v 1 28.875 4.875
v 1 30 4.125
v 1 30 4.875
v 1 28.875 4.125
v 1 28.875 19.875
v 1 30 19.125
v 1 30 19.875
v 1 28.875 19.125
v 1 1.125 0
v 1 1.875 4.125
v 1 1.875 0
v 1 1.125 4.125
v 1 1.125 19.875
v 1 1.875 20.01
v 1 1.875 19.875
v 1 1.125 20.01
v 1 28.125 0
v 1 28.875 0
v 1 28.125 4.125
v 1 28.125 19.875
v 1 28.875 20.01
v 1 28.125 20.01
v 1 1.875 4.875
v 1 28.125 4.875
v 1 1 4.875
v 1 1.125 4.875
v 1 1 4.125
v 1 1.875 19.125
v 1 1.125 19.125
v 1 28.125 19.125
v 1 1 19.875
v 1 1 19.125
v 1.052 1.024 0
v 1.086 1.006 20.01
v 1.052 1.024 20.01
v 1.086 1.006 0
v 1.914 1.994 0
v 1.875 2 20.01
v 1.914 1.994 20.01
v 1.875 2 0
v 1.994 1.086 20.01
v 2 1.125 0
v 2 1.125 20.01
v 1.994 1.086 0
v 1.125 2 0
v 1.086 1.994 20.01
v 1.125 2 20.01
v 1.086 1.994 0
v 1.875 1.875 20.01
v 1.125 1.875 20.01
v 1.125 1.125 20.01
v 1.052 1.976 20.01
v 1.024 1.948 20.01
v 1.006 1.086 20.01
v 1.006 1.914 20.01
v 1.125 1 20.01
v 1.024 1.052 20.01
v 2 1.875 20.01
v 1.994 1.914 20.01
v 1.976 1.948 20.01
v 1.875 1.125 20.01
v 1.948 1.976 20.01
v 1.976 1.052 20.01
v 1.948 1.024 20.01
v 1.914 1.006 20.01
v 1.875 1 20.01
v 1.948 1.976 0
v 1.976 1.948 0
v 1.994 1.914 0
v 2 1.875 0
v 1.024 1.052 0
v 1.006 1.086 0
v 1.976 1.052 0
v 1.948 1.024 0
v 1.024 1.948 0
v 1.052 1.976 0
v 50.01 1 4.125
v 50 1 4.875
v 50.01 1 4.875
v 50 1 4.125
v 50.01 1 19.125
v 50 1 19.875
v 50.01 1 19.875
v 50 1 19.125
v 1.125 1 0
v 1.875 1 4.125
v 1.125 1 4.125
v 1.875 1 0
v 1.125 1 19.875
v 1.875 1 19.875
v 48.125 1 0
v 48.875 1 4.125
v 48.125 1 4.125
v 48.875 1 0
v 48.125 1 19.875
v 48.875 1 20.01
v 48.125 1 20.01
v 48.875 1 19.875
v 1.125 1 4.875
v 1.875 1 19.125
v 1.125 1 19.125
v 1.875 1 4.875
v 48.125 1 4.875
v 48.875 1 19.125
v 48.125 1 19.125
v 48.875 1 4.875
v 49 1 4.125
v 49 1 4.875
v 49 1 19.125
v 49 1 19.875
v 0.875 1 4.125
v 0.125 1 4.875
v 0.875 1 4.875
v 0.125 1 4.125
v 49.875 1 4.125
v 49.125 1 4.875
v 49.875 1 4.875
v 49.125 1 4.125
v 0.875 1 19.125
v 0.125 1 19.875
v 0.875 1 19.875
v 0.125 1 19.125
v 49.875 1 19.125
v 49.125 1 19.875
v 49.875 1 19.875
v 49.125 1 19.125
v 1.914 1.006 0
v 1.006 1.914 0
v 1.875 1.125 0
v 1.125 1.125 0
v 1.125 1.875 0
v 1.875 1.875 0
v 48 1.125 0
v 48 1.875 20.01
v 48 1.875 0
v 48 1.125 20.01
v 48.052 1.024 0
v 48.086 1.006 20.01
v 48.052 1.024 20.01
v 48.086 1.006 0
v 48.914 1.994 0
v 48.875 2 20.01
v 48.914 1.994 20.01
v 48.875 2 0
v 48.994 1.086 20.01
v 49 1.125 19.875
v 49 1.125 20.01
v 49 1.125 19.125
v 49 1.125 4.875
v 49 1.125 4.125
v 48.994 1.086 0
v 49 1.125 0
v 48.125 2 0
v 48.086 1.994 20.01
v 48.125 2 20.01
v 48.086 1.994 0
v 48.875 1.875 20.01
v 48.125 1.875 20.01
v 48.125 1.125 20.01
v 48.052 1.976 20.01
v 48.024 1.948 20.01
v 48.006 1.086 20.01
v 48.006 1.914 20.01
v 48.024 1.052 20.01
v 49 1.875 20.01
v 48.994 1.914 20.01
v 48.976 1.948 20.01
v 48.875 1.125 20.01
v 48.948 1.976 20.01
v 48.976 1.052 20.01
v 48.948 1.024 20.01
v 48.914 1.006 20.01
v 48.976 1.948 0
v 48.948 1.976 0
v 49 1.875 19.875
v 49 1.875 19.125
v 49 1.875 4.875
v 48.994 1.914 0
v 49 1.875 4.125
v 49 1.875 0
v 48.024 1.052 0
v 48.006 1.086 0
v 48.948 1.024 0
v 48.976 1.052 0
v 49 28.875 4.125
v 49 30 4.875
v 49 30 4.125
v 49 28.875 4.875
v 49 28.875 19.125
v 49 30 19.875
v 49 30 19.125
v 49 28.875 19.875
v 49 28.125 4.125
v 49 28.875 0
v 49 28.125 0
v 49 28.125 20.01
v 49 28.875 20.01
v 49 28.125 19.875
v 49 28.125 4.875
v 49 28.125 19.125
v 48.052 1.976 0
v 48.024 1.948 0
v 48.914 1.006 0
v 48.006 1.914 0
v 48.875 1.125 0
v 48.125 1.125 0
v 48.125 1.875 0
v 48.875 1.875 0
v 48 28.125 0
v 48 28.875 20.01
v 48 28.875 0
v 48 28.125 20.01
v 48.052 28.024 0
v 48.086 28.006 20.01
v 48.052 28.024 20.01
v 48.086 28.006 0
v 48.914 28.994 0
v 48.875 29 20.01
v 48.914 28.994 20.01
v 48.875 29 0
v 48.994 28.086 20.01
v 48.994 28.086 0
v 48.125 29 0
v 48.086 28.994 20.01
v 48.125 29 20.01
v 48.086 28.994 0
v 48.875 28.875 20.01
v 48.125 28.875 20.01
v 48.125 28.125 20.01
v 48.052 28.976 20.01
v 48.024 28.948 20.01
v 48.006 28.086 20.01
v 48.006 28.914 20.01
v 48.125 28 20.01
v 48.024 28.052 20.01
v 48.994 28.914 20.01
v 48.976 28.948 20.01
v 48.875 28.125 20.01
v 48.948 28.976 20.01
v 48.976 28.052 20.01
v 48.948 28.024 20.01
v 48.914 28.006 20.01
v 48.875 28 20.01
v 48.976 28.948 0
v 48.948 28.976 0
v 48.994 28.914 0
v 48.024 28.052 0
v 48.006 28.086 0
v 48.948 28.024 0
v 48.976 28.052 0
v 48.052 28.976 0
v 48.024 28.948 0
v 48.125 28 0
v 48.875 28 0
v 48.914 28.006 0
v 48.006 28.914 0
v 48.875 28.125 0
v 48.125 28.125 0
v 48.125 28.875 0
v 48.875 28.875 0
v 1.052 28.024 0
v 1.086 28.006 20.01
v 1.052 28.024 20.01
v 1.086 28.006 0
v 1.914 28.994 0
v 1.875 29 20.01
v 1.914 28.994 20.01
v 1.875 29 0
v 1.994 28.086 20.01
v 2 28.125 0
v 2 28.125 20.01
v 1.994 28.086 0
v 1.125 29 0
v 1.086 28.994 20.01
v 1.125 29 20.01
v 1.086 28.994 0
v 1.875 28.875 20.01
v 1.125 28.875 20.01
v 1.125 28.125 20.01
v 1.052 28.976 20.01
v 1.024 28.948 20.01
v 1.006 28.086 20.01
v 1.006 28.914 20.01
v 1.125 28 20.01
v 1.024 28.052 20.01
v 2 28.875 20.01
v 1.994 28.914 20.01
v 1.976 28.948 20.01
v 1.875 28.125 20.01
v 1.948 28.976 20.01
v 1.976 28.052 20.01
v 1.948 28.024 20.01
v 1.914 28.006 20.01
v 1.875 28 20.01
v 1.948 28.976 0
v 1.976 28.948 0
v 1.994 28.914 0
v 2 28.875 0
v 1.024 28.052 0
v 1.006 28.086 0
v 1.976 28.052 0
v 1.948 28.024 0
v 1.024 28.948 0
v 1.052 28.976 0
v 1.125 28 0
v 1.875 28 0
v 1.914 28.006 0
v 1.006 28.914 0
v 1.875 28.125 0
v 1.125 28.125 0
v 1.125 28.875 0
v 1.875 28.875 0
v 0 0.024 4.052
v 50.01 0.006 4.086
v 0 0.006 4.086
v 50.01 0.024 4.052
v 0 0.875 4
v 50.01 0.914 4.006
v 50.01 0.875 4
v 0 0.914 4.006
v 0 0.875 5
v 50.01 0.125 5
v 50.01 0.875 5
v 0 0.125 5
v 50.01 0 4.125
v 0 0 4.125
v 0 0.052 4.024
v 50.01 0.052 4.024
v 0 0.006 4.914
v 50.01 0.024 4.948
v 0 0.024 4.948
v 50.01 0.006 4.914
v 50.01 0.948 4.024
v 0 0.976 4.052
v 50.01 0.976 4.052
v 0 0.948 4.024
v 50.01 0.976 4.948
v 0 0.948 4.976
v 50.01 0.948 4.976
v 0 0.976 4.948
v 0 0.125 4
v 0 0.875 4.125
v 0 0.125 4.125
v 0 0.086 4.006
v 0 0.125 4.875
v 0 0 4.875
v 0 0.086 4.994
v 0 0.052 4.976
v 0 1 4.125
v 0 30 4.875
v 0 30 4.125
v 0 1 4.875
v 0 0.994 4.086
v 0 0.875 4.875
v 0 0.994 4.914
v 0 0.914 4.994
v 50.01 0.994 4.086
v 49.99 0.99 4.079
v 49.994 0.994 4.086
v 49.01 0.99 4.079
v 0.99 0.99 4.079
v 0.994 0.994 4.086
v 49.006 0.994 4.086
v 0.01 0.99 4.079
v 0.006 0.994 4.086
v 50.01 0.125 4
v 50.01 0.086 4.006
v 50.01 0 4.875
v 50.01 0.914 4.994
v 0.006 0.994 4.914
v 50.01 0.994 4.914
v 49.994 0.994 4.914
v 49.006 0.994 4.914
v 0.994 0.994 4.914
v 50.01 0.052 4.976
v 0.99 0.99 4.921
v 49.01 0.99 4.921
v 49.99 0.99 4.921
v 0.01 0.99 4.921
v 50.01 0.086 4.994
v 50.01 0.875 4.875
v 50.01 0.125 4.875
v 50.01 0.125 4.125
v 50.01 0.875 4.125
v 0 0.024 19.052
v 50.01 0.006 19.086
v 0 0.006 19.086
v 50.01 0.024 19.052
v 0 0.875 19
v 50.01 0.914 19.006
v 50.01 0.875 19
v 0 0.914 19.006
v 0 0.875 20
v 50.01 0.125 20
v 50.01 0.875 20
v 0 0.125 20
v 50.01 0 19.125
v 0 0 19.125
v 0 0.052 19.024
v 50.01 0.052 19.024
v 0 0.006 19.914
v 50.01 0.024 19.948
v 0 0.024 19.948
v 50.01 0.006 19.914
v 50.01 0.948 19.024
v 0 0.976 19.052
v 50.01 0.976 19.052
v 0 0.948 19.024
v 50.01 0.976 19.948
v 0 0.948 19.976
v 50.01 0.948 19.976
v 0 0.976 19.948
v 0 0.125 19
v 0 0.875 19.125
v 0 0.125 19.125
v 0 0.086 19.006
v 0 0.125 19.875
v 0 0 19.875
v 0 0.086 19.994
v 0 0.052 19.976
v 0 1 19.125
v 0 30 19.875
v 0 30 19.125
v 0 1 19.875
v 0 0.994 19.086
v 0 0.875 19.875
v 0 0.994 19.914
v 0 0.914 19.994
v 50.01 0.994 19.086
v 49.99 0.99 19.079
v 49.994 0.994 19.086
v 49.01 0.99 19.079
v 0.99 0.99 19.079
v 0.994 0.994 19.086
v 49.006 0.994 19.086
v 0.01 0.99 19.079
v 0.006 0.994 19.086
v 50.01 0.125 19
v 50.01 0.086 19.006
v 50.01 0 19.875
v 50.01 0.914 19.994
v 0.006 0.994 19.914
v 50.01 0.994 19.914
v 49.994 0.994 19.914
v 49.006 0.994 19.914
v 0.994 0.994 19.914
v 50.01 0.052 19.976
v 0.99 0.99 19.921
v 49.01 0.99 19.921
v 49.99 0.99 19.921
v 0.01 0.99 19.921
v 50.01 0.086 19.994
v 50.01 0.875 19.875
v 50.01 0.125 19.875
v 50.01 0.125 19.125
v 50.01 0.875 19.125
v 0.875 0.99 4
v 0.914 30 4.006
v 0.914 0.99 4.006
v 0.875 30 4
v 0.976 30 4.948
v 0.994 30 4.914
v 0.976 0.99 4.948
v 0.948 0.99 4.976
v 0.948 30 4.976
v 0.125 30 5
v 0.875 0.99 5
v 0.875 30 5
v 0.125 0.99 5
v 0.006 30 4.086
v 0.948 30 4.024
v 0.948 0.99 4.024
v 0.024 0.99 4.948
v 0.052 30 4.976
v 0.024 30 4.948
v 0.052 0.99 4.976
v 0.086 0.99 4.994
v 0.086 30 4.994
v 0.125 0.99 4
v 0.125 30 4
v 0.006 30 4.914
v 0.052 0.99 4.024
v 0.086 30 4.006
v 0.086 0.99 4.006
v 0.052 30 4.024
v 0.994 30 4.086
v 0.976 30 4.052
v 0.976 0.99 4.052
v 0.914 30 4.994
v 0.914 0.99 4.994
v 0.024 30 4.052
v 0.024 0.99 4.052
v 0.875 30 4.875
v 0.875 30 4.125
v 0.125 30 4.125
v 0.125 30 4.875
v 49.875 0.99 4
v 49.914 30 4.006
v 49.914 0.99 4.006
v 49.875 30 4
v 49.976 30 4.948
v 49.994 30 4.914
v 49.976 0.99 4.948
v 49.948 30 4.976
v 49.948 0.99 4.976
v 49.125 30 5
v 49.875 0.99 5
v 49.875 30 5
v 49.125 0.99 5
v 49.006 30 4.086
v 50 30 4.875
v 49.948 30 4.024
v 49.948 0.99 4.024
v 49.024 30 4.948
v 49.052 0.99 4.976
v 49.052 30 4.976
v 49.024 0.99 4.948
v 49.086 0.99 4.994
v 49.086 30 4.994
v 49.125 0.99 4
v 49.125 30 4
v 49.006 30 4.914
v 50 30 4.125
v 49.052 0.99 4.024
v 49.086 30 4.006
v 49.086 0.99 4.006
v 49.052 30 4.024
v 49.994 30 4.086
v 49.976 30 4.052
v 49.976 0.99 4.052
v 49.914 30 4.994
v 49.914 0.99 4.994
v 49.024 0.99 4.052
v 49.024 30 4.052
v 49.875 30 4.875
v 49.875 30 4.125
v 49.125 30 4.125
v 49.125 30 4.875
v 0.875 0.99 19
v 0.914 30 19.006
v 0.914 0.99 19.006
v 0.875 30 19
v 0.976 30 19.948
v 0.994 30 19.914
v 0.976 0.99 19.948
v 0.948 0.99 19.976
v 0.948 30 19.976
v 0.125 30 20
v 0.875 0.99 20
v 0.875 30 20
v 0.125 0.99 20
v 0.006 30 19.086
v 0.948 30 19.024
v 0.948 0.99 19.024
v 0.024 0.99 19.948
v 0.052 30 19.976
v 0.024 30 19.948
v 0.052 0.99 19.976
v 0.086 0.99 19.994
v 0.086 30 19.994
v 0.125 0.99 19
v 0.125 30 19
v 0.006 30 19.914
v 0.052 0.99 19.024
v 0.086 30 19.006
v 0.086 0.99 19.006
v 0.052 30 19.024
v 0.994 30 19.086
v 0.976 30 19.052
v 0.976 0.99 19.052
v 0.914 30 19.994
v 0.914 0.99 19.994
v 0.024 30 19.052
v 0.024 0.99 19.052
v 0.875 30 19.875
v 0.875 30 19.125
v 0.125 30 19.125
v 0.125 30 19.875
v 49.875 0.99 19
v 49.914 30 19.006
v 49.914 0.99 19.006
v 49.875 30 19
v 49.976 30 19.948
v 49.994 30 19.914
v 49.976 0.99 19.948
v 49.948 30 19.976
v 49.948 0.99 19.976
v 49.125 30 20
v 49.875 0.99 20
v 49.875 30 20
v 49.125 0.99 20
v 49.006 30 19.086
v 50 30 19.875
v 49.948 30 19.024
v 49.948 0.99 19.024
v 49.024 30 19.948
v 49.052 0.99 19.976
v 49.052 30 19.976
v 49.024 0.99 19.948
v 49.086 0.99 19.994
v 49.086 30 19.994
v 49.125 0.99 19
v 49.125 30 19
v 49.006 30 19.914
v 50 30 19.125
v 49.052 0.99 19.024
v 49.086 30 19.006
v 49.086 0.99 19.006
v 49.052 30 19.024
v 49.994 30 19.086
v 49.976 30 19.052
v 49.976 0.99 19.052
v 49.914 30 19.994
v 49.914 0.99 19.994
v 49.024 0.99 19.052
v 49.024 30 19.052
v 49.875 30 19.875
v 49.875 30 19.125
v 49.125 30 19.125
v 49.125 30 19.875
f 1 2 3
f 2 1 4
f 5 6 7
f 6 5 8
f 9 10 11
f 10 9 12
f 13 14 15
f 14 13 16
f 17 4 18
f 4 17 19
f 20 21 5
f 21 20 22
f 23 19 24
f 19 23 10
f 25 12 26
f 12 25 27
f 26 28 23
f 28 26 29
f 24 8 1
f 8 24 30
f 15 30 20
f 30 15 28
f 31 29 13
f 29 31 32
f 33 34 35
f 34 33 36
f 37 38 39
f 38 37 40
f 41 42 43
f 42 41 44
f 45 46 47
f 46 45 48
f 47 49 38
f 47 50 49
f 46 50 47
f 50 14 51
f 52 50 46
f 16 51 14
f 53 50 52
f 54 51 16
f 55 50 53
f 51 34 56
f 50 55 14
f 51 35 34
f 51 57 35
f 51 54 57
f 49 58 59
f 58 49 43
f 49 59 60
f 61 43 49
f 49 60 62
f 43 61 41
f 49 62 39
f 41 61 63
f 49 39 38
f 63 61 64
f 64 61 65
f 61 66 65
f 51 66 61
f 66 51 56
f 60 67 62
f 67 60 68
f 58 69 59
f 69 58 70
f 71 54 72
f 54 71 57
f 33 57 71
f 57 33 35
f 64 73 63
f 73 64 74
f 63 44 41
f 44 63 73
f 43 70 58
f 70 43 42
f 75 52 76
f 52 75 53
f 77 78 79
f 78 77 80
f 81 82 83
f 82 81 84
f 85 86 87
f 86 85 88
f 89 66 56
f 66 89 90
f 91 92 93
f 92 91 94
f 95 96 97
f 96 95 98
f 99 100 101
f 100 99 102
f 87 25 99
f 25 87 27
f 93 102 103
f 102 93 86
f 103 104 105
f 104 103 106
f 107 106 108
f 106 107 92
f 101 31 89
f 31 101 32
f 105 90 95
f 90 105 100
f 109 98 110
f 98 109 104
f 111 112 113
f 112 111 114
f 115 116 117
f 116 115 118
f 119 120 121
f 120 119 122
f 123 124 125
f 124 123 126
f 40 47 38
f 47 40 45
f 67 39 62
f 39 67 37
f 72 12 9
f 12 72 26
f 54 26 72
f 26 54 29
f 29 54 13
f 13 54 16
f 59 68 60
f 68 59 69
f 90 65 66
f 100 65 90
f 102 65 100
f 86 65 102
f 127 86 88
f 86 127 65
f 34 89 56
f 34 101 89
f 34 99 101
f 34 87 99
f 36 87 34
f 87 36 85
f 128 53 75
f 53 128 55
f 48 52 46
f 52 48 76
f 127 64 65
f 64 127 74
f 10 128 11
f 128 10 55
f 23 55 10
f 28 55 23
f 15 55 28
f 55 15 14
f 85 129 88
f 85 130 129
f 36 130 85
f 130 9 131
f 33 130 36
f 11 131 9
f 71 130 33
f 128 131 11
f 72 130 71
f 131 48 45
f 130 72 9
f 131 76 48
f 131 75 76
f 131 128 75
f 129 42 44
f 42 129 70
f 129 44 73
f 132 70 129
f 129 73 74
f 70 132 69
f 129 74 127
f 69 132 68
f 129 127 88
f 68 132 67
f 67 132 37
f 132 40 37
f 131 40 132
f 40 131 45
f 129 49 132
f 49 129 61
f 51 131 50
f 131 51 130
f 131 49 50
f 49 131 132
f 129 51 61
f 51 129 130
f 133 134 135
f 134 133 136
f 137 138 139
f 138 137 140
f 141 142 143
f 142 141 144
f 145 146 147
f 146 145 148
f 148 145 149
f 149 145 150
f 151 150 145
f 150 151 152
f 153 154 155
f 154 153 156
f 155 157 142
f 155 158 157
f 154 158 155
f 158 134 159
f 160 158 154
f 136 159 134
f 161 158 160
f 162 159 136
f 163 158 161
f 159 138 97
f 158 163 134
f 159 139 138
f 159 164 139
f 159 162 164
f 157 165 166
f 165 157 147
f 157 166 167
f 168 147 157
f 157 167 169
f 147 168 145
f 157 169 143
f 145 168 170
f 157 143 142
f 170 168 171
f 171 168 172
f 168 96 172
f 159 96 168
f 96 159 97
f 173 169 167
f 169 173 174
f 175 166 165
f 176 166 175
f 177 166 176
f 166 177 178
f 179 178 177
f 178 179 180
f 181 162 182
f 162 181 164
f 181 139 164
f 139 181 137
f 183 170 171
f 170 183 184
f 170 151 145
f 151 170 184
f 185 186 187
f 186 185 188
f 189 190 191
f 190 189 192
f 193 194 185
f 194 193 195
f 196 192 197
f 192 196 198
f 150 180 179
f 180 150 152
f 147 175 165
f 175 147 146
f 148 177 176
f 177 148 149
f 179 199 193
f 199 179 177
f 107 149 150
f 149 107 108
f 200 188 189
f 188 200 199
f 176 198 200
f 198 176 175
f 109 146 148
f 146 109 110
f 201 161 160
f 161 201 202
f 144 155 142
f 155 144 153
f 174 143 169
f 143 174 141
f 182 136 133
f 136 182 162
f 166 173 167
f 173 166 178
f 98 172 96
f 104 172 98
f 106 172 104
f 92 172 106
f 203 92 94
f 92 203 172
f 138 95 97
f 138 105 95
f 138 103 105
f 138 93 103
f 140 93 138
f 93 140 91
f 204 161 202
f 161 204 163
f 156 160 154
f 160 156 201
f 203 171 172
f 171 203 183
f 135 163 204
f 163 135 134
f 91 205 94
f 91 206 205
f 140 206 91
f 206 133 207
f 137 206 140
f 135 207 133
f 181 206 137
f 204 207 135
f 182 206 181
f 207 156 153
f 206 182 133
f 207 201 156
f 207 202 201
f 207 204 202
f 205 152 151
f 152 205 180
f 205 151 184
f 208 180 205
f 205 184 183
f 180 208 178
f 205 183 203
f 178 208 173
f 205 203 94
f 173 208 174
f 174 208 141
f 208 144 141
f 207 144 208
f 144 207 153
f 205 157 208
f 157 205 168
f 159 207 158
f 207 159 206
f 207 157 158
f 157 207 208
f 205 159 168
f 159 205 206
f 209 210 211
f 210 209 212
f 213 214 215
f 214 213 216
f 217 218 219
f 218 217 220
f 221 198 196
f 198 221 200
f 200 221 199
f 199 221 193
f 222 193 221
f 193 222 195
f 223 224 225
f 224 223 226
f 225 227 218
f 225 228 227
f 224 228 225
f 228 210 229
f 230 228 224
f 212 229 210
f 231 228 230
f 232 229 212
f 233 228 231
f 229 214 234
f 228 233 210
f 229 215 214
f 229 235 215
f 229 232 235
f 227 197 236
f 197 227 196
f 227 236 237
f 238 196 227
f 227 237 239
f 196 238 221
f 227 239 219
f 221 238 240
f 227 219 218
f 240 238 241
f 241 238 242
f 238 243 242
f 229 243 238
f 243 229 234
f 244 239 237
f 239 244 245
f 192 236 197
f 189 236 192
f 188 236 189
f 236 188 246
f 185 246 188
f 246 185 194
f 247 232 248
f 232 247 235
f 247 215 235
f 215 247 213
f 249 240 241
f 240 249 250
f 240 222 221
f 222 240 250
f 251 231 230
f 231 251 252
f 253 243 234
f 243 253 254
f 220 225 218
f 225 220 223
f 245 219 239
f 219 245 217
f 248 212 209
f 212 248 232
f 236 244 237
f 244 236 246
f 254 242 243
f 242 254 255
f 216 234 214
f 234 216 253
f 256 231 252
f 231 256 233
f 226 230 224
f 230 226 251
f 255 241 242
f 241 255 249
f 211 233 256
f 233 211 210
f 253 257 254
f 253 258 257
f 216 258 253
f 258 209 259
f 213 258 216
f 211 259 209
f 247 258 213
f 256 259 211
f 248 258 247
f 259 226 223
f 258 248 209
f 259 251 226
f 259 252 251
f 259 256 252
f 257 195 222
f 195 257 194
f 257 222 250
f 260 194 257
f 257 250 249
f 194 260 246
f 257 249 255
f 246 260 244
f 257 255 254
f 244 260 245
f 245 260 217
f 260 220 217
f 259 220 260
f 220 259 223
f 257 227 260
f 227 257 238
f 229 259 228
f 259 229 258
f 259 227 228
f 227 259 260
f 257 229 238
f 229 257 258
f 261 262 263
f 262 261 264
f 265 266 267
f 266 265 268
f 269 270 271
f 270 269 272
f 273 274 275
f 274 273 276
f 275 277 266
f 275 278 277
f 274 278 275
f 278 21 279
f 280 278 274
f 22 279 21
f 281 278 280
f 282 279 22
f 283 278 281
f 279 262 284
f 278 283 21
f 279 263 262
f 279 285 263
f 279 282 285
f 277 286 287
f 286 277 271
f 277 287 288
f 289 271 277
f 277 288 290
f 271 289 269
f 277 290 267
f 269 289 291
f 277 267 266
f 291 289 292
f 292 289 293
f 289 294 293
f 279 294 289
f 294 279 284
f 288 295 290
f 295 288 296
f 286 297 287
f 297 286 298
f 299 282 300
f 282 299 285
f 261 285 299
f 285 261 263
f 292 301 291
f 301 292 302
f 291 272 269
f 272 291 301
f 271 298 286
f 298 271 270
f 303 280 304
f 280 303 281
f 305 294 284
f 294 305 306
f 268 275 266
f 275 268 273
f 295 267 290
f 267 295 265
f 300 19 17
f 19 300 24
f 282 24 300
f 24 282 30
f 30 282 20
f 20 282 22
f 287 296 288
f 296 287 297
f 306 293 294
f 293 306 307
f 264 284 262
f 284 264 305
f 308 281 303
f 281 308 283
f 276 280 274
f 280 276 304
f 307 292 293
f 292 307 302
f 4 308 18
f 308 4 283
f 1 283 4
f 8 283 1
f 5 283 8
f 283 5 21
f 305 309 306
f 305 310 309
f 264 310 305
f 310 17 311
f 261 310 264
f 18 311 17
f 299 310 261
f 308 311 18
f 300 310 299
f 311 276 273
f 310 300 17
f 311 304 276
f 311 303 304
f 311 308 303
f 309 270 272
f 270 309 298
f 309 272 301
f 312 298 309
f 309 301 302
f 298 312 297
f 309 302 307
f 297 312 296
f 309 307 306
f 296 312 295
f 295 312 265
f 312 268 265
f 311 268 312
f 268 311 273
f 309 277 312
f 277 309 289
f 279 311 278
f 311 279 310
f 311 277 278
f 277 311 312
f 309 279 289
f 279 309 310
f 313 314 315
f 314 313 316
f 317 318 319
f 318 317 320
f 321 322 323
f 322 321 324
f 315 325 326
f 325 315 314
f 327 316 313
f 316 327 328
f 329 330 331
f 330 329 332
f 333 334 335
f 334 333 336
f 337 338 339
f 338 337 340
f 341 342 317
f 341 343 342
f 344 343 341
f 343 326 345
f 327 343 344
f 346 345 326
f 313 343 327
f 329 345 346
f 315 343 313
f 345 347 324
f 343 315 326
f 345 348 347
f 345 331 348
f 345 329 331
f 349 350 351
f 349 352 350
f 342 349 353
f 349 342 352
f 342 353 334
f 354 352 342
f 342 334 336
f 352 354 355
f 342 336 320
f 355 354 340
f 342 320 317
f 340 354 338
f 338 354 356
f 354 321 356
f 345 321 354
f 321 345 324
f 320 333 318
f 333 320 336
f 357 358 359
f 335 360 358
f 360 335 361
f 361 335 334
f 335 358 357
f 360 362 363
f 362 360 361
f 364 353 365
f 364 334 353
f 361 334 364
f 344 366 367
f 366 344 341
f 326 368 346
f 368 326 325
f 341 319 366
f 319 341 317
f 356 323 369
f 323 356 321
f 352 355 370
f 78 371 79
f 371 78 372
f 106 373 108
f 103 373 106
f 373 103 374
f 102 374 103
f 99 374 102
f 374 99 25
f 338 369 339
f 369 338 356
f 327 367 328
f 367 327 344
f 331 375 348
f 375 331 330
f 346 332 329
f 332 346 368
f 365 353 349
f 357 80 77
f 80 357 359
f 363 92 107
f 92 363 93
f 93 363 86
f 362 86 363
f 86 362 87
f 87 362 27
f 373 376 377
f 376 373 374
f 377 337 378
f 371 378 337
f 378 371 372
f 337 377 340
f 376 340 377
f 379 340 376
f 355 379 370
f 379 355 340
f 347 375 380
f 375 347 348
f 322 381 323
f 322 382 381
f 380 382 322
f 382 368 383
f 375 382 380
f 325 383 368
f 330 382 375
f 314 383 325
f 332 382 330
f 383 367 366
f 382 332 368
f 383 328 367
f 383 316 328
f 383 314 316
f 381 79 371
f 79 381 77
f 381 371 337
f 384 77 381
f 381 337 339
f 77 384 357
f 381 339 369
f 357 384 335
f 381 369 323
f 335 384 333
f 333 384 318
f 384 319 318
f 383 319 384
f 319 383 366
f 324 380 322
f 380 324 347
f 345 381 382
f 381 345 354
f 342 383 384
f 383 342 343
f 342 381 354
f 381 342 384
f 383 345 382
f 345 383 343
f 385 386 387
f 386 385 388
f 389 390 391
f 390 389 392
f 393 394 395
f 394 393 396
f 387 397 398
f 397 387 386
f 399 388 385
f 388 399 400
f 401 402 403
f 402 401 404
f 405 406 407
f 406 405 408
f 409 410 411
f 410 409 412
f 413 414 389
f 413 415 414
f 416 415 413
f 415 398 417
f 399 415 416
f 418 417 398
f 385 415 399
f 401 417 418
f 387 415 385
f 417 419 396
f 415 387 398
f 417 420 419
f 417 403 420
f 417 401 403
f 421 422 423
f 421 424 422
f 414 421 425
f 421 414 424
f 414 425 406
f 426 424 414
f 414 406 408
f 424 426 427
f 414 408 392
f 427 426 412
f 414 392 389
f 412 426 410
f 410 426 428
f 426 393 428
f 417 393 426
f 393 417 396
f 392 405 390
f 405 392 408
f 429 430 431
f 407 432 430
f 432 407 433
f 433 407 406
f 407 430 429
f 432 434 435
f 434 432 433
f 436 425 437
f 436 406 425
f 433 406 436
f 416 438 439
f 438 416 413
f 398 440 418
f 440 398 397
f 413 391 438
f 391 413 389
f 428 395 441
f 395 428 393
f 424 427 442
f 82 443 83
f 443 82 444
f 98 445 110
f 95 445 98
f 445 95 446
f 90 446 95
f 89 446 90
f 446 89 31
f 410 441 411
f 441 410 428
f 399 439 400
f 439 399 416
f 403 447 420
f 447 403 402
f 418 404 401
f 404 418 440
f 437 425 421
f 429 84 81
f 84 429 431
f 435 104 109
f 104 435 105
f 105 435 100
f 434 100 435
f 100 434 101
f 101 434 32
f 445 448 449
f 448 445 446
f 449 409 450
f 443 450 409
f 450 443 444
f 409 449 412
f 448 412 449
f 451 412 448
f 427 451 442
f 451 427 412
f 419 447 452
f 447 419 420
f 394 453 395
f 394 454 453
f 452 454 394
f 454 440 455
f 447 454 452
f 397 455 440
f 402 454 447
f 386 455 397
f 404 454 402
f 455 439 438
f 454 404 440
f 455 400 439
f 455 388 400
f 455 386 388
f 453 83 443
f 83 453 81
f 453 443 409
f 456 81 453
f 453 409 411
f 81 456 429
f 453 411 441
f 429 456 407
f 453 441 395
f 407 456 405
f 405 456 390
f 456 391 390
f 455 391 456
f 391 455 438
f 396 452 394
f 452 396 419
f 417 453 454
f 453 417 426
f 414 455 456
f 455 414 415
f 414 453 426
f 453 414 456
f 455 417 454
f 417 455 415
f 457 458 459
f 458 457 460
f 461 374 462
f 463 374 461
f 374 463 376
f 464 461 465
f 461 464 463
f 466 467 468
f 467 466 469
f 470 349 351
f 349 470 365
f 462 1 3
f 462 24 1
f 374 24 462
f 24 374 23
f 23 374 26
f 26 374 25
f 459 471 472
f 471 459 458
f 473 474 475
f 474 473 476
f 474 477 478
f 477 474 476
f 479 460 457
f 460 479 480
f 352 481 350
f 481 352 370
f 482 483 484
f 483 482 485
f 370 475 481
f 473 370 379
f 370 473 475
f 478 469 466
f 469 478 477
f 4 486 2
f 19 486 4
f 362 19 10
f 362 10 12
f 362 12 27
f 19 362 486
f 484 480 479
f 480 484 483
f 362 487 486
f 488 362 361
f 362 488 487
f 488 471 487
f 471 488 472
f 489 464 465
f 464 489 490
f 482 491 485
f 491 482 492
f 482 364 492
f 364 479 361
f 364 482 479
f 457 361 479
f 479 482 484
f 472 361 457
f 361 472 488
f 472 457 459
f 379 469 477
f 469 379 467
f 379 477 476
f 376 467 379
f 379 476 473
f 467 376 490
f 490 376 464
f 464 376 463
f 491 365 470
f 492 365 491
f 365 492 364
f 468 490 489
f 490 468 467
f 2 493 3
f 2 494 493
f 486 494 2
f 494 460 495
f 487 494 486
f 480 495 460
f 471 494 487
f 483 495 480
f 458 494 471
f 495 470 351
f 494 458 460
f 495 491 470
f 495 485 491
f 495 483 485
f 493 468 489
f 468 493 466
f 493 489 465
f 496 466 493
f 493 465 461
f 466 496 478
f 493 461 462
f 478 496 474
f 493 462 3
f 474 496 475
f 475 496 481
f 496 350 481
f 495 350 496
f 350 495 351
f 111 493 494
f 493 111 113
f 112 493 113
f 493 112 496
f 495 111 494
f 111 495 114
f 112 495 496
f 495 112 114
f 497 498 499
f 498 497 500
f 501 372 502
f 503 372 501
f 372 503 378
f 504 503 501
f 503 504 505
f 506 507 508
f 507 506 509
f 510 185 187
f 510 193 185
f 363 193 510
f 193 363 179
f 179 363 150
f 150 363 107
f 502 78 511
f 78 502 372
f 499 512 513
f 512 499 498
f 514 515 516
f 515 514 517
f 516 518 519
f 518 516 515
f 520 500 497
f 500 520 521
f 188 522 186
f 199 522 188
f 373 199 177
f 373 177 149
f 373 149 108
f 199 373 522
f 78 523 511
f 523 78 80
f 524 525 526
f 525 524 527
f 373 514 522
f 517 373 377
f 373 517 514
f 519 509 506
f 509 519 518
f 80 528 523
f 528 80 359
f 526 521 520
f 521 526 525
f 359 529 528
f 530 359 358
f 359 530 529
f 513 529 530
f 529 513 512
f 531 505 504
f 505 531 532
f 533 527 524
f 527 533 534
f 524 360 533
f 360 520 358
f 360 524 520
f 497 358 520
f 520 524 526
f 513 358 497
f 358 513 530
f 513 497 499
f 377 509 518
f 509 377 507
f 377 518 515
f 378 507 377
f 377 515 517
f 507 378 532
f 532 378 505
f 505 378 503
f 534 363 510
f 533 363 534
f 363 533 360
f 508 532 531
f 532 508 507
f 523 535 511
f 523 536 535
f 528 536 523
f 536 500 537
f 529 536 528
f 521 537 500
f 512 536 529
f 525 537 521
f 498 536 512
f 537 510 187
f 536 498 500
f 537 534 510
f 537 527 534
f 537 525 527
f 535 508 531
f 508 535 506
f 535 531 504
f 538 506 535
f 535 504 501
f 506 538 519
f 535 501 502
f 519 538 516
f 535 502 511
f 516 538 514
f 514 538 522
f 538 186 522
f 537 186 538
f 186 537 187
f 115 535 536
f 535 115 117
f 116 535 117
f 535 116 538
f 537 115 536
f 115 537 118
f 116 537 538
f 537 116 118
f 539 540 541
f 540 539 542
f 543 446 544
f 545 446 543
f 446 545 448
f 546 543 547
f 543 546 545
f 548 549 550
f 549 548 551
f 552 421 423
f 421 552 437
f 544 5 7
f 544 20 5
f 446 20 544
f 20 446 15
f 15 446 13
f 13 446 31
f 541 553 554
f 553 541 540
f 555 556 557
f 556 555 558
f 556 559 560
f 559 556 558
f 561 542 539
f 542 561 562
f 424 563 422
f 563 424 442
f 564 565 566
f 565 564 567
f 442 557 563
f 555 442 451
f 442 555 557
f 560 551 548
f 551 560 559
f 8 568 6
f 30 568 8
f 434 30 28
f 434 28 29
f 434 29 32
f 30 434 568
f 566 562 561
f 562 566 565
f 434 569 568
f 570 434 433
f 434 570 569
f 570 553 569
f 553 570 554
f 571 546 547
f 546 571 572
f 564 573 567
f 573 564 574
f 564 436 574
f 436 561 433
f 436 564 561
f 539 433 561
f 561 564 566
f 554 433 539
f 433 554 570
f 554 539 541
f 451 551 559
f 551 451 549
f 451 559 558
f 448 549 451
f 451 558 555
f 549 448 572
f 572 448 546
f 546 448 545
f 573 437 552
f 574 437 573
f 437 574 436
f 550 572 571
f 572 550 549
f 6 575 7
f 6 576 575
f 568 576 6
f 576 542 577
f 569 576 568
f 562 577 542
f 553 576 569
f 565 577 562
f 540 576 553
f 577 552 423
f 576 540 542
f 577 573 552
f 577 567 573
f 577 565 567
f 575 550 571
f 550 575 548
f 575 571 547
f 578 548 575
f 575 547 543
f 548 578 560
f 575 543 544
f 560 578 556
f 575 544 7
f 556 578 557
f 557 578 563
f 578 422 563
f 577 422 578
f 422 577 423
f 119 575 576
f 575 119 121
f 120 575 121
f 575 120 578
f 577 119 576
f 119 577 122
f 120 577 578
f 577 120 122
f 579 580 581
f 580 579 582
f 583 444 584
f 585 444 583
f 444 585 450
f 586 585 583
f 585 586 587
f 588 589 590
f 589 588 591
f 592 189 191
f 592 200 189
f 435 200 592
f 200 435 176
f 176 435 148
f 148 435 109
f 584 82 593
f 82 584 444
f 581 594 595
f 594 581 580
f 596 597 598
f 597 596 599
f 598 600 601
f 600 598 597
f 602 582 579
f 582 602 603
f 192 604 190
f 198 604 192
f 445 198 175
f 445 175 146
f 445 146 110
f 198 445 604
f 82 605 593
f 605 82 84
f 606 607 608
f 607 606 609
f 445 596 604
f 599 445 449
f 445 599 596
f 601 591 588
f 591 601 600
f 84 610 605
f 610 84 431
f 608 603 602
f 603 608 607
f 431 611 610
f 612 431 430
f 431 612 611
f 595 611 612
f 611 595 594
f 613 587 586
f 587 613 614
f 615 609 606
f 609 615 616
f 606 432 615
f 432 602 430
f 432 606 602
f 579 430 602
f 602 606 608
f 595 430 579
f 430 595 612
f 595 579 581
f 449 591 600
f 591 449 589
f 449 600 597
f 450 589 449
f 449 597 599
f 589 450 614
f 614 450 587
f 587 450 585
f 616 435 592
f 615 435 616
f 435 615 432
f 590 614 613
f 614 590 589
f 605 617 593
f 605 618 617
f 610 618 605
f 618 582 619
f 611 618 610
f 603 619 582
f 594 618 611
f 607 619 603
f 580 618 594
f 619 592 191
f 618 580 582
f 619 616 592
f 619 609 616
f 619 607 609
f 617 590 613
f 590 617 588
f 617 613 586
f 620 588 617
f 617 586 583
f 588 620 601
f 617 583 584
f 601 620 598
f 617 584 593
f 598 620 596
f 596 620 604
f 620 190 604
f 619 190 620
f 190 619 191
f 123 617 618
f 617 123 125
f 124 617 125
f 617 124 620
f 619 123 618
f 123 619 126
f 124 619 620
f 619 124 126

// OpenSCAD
// CONFIGURATION

// Outer dimensions
table_width = 50;
table_depth = 30;
table_height = 20;

foot_rest_height = 5; // Height of the *top*

tube_thickness = 1;
tube_gauge = 1/8;
tube_corner_radius = 1/8;

qr_code = true; // Include QR code with link to Thingiverse
layout = false; // To see the parts laid out beside each other

$fn = 20;

// CONFIGURATION END

// CALCULATIONS

table_z_size = table_height;

foot_rest_z_position = foot_rest_height - tube_thickness;

// CALCULATIONS END

// MODULES

module leg() {
    difference() {
        translate([tube_corner_radius, tube_corner_radius, 0]) {
            minkowski() {
                cube(size = [tube_thickness - tube_corner_radius * 2, tube_thickness - tube_corner_radius * 2, table_z_size]);
                cylinder(r = tube_corner_radius, h = 0.01);
            }
        }
        translate([tube_gauge, tube_gauge, -1]) {
            cube(size = [tube_thickness - tube_gauge * 2, tube_thickness - tube_gauge * 2, table_z_size + 2]);
        }
    }
}

module legs(table_x_size, table_y_size) {
    union() {
        translate([tube_thickness, tube_thickness, 0]) {
            leg();
        }
        translate([table_x_size - tube_thickness * 2, tube_thickness, 0]) {
            leg();
        }
        translate([table_x_size - tube_thickness * 2, table_y_size - tube_thickness * 2, 0]) {
            leg();
        }
        translate([tube_thickness, table_y_size - tube_thickness * 2, 0]) {
            leg();
        }
    }
}

module width_bar(table_x_size) {
    difference() {
        translate([0, tube_corner_radius, tube_corner_radius]) {
            minkowski() {
                cube(size = [table_x_size, tube_thickness - tube_corner_radius * 2, tube_thickness - tube_corner_radius * 2]);
                rotate(a=[0,90,0]) {
                    cylinder(r = tube_corner_radius, h = 0.01);
                }
            }
        }
        translate([-1, tube_gauge, tube_gauge]) {
            cube(size = [table_x_size + 2, tube_thickness - tube_gauge * 2, tube_thickness - tube_gauge * 2]);
        }
    }
}

module width_bars(table_x_size) {
    union() {
        translate([0, 0, foot_rest_z_position]) {
            width_bar(table_x_size);
        }
        translate([0, 0, table_z_size - tube_thickness]) {
            width_bar(table_x_size);
        }
    }
}

module depth_bar(table_y_size) {
    difference() {
        translate([tube_corner_radius, 0, tube_corner_radius]) {
            minkowski() {
                cube(size = [tube_thickness - tube_corner_radius * 2, table_y_size - tube_thickness, tube_thickness - tube_corner_radius * 2]);
                rotate(a=[90,0,0]) {
                    cylinder(r = tube_corner_radius, h = 0.01);
                }
            }
        }
        translate([tube_gauge, -1, tube_gauge]) {
            cube(size = [tube_thickness - tube_gauge * 2, table_y_size + 2, tube_thickness - tube_gauge * 2]);
        }
    }
}

module depth_bars(table_x_size, table_y_size) {
    union() {
        translate([0, tube_thickness, foot_rest_z_position]) {
            depth_bar(table_y_size);
        }
        translate([table_x_size - tube_thickness, tube_thickness, foot_rest_z_position]) {
            depth_bar(table_y_size);
        }
        translate([0, tube_thickness, table_z_size - tube_thickness]) {
            depth_bar(table_y_size);
        }
        translate([table_x_size - tube_thickness, tube_thickness, table_z_size - tube_thickness]) {
            depth_bar(table_y_size);
        }
    }
}

module table(table_x_size, table_y_size) {
    color("Blue") legs(table_x_size, table_y_size);
    color("Orange") width_bars(table_x_size);
    color("Green") depth_bars(table_x_size, table_y_size);
}

// MODULES END

table(table_width, table_depth);

// Inner table example
% translate([2.5 * tube_thickness, 2 * tube_thickness, 0]) {
    table(table_width - 5 * tube_thickness, table_depth - tube_thickness);
}
